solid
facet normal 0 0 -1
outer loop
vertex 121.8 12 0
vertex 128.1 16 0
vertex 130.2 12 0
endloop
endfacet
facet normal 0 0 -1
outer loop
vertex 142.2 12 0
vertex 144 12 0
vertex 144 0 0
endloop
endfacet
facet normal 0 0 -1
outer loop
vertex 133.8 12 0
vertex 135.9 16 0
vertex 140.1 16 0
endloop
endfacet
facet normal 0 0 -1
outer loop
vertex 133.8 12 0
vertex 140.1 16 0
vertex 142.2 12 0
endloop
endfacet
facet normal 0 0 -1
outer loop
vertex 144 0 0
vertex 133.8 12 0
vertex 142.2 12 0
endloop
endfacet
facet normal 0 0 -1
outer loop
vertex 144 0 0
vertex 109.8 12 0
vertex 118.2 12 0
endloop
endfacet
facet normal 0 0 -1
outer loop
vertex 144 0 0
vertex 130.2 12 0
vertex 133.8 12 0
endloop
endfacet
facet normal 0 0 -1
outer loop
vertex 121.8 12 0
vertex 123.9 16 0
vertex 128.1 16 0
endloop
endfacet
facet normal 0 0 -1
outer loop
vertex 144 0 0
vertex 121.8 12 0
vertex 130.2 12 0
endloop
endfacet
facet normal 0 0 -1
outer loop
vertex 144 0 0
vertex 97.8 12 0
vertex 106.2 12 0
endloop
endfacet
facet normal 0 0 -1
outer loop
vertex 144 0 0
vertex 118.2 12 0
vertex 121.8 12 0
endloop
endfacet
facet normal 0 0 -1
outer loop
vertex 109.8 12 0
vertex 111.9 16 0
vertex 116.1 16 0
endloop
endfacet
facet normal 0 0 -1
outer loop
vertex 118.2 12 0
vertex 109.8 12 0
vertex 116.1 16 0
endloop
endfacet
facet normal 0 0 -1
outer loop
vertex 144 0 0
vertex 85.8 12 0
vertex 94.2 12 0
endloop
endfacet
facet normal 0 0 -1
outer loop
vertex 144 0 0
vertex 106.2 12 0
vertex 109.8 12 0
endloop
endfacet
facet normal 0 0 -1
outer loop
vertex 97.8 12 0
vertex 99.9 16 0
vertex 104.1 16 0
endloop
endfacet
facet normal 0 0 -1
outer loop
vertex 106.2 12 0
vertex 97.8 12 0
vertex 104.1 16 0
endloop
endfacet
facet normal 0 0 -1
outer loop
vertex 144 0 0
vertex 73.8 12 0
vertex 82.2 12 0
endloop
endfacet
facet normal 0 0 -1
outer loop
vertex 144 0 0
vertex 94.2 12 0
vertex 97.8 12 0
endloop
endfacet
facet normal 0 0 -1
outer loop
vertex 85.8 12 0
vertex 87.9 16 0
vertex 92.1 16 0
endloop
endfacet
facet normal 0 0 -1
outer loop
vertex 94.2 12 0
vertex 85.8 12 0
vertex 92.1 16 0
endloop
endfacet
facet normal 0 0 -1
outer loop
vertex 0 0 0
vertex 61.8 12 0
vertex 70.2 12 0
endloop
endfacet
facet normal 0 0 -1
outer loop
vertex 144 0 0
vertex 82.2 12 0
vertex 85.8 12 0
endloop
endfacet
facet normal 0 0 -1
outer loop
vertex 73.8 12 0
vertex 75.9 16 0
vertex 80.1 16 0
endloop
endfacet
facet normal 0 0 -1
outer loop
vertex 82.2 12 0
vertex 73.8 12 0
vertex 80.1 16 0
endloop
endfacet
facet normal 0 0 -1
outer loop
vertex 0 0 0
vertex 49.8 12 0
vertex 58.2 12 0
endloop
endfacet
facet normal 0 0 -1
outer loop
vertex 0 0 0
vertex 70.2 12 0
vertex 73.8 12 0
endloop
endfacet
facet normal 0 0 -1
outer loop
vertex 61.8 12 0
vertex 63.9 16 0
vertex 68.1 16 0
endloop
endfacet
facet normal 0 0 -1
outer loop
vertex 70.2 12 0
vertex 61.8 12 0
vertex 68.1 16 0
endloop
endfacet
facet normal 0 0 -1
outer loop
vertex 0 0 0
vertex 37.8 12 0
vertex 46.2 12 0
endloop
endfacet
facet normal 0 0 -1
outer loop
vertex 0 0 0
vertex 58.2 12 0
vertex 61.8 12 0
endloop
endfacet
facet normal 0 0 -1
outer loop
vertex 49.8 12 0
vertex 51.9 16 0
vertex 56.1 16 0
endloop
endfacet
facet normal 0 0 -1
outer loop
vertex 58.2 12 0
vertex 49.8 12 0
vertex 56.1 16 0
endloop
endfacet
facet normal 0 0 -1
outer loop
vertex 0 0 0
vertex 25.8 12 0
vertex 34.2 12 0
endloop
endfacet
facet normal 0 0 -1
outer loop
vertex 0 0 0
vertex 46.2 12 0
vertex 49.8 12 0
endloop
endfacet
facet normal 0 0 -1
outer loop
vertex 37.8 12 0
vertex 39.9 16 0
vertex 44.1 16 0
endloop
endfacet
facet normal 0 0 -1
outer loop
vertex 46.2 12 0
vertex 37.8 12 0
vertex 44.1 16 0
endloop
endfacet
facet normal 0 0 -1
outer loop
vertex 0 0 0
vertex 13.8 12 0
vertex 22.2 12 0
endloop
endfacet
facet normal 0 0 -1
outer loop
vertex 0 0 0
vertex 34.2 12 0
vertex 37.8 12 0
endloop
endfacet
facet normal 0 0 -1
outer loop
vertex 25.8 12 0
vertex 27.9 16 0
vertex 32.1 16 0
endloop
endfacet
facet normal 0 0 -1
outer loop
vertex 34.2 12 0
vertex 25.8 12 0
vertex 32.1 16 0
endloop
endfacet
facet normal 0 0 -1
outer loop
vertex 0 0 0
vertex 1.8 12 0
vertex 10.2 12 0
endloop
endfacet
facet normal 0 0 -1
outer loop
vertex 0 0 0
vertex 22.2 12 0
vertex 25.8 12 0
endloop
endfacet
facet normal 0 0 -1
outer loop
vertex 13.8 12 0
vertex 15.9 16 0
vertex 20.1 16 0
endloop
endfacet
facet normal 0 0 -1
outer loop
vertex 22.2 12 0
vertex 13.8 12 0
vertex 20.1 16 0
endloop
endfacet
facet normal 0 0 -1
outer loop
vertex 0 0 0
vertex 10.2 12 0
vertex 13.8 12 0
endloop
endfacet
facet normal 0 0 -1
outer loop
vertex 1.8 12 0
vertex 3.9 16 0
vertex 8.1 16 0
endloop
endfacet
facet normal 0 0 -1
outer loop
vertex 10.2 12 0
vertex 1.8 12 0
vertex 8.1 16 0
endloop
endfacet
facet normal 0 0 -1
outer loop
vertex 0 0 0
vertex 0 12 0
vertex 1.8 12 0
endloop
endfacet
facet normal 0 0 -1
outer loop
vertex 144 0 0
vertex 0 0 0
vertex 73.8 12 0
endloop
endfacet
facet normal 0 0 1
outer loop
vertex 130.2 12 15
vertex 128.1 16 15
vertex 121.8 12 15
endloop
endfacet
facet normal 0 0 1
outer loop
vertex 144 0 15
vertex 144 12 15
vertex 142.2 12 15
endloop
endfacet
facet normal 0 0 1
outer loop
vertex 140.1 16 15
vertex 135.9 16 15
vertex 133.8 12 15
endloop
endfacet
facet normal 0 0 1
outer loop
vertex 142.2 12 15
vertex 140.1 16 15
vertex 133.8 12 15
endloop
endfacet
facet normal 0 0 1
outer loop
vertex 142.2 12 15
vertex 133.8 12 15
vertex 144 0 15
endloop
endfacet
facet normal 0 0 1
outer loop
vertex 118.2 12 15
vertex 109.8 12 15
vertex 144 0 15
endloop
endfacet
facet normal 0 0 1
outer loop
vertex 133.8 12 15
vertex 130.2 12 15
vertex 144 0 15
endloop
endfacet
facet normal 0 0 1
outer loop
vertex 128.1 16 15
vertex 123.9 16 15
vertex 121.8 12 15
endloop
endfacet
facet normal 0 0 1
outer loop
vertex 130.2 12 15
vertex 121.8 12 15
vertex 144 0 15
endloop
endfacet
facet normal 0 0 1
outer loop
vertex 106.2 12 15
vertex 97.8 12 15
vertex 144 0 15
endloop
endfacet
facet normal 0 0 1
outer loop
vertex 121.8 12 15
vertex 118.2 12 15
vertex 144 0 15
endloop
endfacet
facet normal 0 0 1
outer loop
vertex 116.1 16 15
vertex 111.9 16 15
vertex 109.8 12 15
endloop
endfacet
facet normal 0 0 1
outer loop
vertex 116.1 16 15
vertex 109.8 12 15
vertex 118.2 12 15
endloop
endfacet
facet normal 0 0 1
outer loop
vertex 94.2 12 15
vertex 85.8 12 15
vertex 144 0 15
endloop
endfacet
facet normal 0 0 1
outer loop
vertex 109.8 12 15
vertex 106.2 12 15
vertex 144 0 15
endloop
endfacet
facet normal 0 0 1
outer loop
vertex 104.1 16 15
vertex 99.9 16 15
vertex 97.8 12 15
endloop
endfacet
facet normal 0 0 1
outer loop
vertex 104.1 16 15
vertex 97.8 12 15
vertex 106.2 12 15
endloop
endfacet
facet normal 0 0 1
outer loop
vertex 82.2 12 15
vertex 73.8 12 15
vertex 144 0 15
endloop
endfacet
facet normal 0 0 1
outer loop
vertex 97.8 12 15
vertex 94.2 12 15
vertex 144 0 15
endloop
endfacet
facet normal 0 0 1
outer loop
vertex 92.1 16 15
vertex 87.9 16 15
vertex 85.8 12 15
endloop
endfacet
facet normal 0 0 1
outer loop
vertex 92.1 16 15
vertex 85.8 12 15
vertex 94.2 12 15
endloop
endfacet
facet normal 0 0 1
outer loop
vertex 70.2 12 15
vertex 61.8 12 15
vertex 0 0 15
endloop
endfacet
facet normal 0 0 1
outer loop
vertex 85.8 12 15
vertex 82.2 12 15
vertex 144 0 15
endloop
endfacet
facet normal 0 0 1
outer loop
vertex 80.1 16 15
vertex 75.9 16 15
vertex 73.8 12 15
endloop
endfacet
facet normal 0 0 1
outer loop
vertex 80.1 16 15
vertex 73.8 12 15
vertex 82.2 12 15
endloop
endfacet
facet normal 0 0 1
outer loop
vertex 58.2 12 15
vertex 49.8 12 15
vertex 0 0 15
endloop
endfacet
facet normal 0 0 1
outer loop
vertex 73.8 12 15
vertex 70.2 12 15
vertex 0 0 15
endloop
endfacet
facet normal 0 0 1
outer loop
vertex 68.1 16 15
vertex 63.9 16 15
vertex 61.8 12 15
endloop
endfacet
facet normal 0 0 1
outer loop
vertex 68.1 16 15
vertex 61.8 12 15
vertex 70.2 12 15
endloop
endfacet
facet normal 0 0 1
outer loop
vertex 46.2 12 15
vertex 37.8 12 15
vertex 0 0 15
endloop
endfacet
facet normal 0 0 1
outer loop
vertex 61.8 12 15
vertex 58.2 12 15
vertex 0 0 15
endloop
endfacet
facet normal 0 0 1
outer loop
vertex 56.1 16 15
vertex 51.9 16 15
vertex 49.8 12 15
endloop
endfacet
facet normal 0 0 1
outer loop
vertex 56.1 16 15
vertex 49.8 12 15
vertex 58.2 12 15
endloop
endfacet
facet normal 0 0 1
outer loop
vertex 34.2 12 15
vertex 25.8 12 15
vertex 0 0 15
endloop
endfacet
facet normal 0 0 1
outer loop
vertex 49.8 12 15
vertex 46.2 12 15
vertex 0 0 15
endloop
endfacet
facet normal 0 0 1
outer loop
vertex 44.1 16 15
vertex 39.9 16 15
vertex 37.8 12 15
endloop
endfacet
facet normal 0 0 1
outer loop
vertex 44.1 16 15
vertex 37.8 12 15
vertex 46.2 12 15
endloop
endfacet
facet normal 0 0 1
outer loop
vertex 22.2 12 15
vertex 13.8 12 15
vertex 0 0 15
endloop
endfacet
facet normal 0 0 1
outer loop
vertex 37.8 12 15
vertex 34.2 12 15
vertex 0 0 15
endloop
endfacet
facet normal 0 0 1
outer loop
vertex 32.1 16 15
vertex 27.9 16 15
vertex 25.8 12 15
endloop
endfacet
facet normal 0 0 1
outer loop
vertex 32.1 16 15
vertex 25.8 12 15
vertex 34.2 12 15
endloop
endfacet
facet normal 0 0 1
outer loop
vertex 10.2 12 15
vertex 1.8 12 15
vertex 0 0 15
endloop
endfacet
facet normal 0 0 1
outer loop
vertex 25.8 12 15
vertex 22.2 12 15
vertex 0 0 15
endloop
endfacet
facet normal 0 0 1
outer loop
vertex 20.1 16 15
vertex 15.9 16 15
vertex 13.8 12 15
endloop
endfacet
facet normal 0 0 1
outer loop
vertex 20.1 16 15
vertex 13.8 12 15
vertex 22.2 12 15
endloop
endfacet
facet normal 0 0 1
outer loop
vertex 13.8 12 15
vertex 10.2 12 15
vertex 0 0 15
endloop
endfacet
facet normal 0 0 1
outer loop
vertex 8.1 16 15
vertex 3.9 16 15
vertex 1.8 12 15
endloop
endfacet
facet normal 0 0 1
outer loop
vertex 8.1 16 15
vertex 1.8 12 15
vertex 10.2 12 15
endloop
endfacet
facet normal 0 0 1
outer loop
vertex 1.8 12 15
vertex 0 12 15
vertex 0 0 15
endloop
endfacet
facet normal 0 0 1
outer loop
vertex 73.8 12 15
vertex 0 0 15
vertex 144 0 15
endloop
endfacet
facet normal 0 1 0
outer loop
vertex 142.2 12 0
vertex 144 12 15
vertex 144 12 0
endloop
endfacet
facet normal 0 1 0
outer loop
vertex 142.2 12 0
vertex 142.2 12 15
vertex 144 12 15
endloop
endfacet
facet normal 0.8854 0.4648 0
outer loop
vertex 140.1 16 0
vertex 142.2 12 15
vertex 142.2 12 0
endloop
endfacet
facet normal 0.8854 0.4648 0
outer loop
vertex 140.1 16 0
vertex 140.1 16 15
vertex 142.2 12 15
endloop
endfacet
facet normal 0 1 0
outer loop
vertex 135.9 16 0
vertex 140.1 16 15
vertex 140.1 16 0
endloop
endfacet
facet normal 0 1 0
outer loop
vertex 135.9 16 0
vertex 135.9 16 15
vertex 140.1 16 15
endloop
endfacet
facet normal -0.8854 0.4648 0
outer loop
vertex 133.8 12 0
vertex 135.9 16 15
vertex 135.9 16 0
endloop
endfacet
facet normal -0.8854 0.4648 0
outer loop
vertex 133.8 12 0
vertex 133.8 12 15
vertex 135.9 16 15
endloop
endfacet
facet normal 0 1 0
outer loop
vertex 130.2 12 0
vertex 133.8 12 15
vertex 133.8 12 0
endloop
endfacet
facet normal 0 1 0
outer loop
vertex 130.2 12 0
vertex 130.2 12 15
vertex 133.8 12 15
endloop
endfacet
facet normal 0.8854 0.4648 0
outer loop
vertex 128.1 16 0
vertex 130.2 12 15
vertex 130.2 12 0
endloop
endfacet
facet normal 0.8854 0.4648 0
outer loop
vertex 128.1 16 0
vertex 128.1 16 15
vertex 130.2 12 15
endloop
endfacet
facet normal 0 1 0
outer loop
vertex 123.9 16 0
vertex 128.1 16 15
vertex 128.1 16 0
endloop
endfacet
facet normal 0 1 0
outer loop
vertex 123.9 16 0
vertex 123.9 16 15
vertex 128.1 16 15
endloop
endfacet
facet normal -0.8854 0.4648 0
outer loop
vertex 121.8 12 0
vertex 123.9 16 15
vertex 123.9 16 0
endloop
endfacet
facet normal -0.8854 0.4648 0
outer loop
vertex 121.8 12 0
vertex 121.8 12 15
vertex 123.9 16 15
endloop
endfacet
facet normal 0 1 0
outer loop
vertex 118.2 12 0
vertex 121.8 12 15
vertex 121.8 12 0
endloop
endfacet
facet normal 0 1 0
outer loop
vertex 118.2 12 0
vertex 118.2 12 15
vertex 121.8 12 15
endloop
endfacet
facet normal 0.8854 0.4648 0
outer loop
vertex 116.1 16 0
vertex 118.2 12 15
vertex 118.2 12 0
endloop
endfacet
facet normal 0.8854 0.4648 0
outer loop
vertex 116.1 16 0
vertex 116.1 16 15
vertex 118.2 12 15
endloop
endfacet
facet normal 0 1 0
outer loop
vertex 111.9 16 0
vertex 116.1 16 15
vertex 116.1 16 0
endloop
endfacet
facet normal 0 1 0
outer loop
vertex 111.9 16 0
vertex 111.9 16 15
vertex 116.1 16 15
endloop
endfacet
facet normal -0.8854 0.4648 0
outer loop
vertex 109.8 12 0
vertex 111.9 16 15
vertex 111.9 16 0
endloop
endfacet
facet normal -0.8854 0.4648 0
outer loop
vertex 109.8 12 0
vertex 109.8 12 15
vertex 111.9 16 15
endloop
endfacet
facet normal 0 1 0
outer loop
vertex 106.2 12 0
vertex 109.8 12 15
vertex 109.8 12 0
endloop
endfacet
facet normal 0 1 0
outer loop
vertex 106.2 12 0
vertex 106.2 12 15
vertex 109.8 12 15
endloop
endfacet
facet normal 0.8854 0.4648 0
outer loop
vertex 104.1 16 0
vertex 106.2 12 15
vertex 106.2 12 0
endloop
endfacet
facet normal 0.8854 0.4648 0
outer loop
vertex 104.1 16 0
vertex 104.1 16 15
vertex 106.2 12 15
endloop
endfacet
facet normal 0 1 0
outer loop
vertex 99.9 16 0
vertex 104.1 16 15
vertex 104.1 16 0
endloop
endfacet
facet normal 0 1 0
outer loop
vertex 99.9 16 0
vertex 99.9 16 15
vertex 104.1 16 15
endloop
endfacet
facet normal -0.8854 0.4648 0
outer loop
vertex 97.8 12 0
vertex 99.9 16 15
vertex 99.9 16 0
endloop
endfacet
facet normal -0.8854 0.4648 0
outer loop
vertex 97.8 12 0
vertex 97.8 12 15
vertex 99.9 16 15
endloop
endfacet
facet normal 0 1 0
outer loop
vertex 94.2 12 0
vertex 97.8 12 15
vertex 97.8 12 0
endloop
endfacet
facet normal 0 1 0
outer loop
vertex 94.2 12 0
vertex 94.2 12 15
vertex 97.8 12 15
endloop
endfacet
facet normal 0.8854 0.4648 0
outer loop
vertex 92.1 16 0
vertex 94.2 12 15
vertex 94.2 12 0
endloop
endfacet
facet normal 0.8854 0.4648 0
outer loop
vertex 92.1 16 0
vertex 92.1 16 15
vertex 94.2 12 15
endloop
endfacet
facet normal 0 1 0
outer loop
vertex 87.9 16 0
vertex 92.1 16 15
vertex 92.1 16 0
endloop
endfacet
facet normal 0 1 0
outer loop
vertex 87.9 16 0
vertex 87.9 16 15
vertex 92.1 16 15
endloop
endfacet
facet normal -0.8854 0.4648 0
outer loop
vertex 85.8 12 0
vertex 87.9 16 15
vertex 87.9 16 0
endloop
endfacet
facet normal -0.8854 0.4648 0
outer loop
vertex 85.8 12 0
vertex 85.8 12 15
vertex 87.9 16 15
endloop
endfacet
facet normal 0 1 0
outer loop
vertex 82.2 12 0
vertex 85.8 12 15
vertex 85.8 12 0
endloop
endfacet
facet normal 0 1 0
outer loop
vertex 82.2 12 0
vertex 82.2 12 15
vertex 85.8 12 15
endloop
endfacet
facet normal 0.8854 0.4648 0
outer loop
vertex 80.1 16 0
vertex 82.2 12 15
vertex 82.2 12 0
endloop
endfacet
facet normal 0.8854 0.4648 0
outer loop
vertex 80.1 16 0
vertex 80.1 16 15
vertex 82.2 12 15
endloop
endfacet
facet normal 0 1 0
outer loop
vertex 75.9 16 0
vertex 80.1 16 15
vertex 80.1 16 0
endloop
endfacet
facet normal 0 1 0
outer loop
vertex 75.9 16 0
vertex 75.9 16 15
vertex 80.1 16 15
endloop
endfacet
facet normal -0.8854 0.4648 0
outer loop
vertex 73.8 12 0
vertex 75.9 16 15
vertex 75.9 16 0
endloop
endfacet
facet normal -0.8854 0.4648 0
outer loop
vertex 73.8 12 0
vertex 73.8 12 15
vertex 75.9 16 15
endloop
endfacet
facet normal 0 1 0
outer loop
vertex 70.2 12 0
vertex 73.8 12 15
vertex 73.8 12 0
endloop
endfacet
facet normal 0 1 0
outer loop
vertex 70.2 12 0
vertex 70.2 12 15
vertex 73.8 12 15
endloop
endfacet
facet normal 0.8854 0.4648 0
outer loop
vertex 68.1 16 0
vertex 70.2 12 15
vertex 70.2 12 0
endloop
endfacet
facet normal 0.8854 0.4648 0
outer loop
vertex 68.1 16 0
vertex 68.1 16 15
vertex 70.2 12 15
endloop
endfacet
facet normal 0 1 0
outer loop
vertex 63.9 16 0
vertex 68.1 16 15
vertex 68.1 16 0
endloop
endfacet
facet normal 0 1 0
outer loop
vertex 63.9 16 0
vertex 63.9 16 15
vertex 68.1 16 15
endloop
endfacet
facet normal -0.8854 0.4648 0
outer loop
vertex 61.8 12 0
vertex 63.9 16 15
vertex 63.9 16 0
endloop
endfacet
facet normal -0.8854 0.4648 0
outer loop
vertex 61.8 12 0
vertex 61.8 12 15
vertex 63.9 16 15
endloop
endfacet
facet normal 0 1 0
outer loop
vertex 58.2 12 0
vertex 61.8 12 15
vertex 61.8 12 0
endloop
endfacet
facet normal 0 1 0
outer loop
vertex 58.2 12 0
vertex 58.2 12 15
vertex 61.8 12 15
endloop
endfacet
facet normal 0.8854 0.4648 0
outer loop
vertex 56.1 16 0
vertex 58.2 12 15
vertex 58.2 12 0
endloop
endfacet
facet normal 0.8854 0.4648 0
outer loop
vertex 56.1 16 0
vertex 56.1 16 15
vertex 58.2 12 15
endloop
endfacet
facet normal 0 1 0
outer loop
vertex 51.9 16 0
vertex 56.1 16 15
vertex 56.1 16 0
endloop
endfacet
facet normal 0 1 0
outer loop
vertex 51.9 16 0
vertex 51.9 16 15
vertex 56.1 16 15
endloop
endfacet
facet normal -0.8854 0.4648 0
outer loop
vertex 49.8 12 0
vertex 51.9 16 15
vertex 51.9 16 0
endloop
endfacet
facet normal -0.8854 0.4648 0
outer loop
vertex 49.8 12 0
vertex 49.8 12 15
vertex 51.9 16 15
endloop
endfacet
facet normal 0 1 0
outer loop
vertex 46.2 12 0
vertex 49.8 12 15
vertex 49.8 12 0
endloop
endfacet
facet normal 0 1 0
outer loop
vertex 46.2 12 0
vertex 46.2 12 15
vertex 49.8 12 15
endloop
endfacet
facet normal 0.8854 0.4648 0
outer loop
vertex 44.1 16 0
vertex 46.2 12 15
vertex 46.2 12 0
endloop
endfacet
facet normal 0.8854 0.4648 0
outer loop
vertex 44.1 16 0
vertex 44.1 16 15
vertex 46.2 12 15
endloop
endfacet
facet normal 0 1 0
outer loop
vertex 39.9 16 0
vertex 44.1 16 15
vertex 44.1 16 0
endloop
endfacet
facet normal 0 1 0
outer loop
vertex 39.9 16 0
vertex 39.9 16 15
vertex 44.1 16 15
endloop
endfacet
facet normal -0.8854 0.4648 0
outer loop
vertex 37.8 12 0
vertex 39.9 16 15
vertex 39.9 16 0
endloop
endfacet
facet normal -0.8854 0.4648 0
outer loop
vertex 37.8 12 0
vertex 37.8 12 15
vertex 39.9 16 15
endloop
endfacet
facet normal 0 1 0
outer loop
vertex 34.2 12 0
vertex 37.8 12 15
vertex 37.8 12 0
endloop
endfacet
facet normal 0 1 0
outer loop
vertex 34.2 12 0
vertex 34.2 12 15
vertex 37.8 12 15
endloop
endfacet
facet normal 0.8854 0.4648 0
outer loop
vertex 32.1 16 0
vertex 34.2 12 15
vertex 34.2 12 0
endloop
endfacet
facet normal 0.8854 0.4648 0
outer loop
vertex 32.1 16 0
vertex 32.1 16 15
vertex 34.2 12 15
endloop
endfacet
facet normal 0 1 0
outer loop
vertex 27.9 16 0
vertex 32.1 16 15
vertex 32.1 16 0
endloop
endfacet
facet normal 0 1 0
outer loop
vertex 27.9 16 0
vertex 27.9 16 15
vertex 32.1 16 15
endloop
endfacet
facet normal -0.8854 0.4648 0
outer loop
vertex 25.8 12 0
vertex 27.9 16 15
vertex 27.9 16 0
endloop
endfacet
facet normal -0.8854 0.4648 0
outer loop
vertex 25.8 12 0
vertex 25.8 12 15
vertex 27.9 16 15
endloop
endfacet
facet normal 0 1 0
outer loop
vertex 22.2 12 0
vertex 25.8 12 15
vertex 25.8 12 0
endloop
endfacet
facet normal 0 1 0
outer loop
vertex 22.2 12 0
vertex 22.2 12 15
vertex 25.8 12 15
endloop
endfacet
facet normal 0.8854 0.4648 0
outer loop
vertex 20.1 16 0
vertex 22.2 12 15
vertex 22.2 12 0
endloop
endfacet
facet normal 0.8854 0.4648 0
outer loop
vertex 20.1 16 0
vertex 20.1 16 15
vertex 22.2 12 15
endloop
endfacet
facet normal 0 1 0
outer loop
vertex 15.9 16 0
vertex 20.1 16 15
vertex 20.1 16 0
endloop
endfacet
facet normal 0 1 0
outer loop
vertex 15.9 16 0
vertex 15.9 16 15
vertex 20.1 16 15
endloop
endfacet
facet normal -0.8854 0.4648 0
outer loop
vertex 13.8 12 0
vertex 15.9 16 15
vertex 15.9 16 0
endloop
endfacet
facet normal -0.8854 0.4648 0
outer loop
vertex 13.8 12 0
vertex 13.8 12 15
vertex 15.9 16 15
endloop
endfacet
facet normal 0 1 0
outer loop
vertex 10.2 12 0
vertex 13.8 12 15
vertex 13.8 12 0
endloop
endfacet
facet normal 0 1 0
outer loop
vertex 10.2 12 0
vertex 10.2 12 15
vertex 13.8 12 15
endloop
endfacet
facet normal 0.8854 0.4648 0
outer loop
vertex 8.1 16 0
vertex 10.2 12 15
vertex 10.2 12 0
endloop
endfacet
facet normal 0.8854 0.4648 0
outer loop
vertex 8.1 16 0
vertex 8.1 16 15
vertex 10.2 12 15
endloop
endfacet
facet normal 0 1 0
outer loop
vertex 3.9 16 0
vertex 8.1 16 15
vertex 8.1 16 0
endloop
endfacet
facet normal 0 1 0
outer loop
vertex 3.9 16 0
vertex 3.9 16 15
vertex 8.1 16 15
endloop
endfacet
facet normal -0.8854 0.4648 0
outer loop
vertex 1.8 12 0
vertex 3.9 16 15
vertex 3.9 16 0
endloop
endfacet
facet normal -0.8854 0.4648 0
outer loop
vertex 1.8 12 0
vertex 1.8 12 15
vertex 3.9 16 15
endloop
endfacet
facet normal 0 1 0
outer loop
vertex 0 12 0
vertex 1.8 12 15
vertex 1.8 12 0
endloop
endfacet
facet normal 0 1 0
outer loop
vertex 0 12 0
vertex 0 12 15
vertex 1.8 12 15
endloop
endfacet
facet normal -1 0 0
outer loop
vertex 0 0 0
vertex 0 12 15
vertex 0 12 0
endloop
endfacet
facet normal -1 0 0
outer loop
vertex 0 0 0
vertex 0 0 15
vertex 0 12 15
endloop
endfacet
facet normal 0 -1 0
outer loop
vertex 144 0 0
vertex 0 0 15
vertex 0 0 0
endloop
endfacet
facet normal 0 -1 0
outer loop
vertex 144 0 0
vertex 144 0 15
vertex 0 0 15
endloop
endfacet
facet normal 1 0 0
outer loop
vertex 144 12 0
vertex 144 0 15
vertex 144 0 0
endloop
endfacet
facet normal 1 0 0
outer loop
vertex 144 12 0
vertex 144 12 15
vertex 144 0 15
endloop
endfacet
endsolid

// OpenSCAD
$fn = 32;

// ----------------------------------------------------------------------
// Gear rack: 12 teeth, pitch 12 mm
// ----------------------------------------------------------------------

// --- parameters (mm) ---
teeth = 12;               // number of teeth
pitch = 12;               // tooth pitch, X
root_w = 8.4;             // tooth width at the root
tip_w = 4.2;              // tooth width at the tip
base_h = 12;              // rack body height, Y
tooth_h = 4;              // tooth height above the body
plate_t = 15;             // rack width, Z (extrusion height)

rack_l = teeth * pitch;  // overall length
total_h = base_h + tooth_h;  // overall height

profile = [[0, 0], [144, 0], [144, 12], [142.2, 12], [140.1, 16], [135.9, 16], [133.8, 12], [130.2, 12], [128.1, 16], [123.9, 16], [121.8, 12], [118.2, 12], [116.1, 16], [111.9, 16], [109.8, 12], [106.2, 12], [104.1, 16], [99.9, 16], [97.8, 12], [94.2, 12], [92.1, 16], [87.9, 16], [85.8, 12], [82.2, 12], [80.1, 16], [75.9, 16], [73.8, 12], [70.2, 12], [68.1, 16], [63.9, 16], [61.8, 12], [58.2, 12], [56.1, 16], [51.9, 16], [49.8, 12], [46.2, 12], [44.1, 16], [39.9, 16], [37.8, 12], [34.2, 12], [32.1, 16], [27.9, 16], [25.8, 12], [22.2, 12], [20.1, 16], [15.9, 16], [13.8, 12], [10.2, 12], [8.1, 16], [3.9, 16], [1.8, 12], [0, 12]];  // primary outline, 52 points, counter clockwise

// --- the one profile operation ---
linear_extrude(height = plate_t) polygon(points = profile);
